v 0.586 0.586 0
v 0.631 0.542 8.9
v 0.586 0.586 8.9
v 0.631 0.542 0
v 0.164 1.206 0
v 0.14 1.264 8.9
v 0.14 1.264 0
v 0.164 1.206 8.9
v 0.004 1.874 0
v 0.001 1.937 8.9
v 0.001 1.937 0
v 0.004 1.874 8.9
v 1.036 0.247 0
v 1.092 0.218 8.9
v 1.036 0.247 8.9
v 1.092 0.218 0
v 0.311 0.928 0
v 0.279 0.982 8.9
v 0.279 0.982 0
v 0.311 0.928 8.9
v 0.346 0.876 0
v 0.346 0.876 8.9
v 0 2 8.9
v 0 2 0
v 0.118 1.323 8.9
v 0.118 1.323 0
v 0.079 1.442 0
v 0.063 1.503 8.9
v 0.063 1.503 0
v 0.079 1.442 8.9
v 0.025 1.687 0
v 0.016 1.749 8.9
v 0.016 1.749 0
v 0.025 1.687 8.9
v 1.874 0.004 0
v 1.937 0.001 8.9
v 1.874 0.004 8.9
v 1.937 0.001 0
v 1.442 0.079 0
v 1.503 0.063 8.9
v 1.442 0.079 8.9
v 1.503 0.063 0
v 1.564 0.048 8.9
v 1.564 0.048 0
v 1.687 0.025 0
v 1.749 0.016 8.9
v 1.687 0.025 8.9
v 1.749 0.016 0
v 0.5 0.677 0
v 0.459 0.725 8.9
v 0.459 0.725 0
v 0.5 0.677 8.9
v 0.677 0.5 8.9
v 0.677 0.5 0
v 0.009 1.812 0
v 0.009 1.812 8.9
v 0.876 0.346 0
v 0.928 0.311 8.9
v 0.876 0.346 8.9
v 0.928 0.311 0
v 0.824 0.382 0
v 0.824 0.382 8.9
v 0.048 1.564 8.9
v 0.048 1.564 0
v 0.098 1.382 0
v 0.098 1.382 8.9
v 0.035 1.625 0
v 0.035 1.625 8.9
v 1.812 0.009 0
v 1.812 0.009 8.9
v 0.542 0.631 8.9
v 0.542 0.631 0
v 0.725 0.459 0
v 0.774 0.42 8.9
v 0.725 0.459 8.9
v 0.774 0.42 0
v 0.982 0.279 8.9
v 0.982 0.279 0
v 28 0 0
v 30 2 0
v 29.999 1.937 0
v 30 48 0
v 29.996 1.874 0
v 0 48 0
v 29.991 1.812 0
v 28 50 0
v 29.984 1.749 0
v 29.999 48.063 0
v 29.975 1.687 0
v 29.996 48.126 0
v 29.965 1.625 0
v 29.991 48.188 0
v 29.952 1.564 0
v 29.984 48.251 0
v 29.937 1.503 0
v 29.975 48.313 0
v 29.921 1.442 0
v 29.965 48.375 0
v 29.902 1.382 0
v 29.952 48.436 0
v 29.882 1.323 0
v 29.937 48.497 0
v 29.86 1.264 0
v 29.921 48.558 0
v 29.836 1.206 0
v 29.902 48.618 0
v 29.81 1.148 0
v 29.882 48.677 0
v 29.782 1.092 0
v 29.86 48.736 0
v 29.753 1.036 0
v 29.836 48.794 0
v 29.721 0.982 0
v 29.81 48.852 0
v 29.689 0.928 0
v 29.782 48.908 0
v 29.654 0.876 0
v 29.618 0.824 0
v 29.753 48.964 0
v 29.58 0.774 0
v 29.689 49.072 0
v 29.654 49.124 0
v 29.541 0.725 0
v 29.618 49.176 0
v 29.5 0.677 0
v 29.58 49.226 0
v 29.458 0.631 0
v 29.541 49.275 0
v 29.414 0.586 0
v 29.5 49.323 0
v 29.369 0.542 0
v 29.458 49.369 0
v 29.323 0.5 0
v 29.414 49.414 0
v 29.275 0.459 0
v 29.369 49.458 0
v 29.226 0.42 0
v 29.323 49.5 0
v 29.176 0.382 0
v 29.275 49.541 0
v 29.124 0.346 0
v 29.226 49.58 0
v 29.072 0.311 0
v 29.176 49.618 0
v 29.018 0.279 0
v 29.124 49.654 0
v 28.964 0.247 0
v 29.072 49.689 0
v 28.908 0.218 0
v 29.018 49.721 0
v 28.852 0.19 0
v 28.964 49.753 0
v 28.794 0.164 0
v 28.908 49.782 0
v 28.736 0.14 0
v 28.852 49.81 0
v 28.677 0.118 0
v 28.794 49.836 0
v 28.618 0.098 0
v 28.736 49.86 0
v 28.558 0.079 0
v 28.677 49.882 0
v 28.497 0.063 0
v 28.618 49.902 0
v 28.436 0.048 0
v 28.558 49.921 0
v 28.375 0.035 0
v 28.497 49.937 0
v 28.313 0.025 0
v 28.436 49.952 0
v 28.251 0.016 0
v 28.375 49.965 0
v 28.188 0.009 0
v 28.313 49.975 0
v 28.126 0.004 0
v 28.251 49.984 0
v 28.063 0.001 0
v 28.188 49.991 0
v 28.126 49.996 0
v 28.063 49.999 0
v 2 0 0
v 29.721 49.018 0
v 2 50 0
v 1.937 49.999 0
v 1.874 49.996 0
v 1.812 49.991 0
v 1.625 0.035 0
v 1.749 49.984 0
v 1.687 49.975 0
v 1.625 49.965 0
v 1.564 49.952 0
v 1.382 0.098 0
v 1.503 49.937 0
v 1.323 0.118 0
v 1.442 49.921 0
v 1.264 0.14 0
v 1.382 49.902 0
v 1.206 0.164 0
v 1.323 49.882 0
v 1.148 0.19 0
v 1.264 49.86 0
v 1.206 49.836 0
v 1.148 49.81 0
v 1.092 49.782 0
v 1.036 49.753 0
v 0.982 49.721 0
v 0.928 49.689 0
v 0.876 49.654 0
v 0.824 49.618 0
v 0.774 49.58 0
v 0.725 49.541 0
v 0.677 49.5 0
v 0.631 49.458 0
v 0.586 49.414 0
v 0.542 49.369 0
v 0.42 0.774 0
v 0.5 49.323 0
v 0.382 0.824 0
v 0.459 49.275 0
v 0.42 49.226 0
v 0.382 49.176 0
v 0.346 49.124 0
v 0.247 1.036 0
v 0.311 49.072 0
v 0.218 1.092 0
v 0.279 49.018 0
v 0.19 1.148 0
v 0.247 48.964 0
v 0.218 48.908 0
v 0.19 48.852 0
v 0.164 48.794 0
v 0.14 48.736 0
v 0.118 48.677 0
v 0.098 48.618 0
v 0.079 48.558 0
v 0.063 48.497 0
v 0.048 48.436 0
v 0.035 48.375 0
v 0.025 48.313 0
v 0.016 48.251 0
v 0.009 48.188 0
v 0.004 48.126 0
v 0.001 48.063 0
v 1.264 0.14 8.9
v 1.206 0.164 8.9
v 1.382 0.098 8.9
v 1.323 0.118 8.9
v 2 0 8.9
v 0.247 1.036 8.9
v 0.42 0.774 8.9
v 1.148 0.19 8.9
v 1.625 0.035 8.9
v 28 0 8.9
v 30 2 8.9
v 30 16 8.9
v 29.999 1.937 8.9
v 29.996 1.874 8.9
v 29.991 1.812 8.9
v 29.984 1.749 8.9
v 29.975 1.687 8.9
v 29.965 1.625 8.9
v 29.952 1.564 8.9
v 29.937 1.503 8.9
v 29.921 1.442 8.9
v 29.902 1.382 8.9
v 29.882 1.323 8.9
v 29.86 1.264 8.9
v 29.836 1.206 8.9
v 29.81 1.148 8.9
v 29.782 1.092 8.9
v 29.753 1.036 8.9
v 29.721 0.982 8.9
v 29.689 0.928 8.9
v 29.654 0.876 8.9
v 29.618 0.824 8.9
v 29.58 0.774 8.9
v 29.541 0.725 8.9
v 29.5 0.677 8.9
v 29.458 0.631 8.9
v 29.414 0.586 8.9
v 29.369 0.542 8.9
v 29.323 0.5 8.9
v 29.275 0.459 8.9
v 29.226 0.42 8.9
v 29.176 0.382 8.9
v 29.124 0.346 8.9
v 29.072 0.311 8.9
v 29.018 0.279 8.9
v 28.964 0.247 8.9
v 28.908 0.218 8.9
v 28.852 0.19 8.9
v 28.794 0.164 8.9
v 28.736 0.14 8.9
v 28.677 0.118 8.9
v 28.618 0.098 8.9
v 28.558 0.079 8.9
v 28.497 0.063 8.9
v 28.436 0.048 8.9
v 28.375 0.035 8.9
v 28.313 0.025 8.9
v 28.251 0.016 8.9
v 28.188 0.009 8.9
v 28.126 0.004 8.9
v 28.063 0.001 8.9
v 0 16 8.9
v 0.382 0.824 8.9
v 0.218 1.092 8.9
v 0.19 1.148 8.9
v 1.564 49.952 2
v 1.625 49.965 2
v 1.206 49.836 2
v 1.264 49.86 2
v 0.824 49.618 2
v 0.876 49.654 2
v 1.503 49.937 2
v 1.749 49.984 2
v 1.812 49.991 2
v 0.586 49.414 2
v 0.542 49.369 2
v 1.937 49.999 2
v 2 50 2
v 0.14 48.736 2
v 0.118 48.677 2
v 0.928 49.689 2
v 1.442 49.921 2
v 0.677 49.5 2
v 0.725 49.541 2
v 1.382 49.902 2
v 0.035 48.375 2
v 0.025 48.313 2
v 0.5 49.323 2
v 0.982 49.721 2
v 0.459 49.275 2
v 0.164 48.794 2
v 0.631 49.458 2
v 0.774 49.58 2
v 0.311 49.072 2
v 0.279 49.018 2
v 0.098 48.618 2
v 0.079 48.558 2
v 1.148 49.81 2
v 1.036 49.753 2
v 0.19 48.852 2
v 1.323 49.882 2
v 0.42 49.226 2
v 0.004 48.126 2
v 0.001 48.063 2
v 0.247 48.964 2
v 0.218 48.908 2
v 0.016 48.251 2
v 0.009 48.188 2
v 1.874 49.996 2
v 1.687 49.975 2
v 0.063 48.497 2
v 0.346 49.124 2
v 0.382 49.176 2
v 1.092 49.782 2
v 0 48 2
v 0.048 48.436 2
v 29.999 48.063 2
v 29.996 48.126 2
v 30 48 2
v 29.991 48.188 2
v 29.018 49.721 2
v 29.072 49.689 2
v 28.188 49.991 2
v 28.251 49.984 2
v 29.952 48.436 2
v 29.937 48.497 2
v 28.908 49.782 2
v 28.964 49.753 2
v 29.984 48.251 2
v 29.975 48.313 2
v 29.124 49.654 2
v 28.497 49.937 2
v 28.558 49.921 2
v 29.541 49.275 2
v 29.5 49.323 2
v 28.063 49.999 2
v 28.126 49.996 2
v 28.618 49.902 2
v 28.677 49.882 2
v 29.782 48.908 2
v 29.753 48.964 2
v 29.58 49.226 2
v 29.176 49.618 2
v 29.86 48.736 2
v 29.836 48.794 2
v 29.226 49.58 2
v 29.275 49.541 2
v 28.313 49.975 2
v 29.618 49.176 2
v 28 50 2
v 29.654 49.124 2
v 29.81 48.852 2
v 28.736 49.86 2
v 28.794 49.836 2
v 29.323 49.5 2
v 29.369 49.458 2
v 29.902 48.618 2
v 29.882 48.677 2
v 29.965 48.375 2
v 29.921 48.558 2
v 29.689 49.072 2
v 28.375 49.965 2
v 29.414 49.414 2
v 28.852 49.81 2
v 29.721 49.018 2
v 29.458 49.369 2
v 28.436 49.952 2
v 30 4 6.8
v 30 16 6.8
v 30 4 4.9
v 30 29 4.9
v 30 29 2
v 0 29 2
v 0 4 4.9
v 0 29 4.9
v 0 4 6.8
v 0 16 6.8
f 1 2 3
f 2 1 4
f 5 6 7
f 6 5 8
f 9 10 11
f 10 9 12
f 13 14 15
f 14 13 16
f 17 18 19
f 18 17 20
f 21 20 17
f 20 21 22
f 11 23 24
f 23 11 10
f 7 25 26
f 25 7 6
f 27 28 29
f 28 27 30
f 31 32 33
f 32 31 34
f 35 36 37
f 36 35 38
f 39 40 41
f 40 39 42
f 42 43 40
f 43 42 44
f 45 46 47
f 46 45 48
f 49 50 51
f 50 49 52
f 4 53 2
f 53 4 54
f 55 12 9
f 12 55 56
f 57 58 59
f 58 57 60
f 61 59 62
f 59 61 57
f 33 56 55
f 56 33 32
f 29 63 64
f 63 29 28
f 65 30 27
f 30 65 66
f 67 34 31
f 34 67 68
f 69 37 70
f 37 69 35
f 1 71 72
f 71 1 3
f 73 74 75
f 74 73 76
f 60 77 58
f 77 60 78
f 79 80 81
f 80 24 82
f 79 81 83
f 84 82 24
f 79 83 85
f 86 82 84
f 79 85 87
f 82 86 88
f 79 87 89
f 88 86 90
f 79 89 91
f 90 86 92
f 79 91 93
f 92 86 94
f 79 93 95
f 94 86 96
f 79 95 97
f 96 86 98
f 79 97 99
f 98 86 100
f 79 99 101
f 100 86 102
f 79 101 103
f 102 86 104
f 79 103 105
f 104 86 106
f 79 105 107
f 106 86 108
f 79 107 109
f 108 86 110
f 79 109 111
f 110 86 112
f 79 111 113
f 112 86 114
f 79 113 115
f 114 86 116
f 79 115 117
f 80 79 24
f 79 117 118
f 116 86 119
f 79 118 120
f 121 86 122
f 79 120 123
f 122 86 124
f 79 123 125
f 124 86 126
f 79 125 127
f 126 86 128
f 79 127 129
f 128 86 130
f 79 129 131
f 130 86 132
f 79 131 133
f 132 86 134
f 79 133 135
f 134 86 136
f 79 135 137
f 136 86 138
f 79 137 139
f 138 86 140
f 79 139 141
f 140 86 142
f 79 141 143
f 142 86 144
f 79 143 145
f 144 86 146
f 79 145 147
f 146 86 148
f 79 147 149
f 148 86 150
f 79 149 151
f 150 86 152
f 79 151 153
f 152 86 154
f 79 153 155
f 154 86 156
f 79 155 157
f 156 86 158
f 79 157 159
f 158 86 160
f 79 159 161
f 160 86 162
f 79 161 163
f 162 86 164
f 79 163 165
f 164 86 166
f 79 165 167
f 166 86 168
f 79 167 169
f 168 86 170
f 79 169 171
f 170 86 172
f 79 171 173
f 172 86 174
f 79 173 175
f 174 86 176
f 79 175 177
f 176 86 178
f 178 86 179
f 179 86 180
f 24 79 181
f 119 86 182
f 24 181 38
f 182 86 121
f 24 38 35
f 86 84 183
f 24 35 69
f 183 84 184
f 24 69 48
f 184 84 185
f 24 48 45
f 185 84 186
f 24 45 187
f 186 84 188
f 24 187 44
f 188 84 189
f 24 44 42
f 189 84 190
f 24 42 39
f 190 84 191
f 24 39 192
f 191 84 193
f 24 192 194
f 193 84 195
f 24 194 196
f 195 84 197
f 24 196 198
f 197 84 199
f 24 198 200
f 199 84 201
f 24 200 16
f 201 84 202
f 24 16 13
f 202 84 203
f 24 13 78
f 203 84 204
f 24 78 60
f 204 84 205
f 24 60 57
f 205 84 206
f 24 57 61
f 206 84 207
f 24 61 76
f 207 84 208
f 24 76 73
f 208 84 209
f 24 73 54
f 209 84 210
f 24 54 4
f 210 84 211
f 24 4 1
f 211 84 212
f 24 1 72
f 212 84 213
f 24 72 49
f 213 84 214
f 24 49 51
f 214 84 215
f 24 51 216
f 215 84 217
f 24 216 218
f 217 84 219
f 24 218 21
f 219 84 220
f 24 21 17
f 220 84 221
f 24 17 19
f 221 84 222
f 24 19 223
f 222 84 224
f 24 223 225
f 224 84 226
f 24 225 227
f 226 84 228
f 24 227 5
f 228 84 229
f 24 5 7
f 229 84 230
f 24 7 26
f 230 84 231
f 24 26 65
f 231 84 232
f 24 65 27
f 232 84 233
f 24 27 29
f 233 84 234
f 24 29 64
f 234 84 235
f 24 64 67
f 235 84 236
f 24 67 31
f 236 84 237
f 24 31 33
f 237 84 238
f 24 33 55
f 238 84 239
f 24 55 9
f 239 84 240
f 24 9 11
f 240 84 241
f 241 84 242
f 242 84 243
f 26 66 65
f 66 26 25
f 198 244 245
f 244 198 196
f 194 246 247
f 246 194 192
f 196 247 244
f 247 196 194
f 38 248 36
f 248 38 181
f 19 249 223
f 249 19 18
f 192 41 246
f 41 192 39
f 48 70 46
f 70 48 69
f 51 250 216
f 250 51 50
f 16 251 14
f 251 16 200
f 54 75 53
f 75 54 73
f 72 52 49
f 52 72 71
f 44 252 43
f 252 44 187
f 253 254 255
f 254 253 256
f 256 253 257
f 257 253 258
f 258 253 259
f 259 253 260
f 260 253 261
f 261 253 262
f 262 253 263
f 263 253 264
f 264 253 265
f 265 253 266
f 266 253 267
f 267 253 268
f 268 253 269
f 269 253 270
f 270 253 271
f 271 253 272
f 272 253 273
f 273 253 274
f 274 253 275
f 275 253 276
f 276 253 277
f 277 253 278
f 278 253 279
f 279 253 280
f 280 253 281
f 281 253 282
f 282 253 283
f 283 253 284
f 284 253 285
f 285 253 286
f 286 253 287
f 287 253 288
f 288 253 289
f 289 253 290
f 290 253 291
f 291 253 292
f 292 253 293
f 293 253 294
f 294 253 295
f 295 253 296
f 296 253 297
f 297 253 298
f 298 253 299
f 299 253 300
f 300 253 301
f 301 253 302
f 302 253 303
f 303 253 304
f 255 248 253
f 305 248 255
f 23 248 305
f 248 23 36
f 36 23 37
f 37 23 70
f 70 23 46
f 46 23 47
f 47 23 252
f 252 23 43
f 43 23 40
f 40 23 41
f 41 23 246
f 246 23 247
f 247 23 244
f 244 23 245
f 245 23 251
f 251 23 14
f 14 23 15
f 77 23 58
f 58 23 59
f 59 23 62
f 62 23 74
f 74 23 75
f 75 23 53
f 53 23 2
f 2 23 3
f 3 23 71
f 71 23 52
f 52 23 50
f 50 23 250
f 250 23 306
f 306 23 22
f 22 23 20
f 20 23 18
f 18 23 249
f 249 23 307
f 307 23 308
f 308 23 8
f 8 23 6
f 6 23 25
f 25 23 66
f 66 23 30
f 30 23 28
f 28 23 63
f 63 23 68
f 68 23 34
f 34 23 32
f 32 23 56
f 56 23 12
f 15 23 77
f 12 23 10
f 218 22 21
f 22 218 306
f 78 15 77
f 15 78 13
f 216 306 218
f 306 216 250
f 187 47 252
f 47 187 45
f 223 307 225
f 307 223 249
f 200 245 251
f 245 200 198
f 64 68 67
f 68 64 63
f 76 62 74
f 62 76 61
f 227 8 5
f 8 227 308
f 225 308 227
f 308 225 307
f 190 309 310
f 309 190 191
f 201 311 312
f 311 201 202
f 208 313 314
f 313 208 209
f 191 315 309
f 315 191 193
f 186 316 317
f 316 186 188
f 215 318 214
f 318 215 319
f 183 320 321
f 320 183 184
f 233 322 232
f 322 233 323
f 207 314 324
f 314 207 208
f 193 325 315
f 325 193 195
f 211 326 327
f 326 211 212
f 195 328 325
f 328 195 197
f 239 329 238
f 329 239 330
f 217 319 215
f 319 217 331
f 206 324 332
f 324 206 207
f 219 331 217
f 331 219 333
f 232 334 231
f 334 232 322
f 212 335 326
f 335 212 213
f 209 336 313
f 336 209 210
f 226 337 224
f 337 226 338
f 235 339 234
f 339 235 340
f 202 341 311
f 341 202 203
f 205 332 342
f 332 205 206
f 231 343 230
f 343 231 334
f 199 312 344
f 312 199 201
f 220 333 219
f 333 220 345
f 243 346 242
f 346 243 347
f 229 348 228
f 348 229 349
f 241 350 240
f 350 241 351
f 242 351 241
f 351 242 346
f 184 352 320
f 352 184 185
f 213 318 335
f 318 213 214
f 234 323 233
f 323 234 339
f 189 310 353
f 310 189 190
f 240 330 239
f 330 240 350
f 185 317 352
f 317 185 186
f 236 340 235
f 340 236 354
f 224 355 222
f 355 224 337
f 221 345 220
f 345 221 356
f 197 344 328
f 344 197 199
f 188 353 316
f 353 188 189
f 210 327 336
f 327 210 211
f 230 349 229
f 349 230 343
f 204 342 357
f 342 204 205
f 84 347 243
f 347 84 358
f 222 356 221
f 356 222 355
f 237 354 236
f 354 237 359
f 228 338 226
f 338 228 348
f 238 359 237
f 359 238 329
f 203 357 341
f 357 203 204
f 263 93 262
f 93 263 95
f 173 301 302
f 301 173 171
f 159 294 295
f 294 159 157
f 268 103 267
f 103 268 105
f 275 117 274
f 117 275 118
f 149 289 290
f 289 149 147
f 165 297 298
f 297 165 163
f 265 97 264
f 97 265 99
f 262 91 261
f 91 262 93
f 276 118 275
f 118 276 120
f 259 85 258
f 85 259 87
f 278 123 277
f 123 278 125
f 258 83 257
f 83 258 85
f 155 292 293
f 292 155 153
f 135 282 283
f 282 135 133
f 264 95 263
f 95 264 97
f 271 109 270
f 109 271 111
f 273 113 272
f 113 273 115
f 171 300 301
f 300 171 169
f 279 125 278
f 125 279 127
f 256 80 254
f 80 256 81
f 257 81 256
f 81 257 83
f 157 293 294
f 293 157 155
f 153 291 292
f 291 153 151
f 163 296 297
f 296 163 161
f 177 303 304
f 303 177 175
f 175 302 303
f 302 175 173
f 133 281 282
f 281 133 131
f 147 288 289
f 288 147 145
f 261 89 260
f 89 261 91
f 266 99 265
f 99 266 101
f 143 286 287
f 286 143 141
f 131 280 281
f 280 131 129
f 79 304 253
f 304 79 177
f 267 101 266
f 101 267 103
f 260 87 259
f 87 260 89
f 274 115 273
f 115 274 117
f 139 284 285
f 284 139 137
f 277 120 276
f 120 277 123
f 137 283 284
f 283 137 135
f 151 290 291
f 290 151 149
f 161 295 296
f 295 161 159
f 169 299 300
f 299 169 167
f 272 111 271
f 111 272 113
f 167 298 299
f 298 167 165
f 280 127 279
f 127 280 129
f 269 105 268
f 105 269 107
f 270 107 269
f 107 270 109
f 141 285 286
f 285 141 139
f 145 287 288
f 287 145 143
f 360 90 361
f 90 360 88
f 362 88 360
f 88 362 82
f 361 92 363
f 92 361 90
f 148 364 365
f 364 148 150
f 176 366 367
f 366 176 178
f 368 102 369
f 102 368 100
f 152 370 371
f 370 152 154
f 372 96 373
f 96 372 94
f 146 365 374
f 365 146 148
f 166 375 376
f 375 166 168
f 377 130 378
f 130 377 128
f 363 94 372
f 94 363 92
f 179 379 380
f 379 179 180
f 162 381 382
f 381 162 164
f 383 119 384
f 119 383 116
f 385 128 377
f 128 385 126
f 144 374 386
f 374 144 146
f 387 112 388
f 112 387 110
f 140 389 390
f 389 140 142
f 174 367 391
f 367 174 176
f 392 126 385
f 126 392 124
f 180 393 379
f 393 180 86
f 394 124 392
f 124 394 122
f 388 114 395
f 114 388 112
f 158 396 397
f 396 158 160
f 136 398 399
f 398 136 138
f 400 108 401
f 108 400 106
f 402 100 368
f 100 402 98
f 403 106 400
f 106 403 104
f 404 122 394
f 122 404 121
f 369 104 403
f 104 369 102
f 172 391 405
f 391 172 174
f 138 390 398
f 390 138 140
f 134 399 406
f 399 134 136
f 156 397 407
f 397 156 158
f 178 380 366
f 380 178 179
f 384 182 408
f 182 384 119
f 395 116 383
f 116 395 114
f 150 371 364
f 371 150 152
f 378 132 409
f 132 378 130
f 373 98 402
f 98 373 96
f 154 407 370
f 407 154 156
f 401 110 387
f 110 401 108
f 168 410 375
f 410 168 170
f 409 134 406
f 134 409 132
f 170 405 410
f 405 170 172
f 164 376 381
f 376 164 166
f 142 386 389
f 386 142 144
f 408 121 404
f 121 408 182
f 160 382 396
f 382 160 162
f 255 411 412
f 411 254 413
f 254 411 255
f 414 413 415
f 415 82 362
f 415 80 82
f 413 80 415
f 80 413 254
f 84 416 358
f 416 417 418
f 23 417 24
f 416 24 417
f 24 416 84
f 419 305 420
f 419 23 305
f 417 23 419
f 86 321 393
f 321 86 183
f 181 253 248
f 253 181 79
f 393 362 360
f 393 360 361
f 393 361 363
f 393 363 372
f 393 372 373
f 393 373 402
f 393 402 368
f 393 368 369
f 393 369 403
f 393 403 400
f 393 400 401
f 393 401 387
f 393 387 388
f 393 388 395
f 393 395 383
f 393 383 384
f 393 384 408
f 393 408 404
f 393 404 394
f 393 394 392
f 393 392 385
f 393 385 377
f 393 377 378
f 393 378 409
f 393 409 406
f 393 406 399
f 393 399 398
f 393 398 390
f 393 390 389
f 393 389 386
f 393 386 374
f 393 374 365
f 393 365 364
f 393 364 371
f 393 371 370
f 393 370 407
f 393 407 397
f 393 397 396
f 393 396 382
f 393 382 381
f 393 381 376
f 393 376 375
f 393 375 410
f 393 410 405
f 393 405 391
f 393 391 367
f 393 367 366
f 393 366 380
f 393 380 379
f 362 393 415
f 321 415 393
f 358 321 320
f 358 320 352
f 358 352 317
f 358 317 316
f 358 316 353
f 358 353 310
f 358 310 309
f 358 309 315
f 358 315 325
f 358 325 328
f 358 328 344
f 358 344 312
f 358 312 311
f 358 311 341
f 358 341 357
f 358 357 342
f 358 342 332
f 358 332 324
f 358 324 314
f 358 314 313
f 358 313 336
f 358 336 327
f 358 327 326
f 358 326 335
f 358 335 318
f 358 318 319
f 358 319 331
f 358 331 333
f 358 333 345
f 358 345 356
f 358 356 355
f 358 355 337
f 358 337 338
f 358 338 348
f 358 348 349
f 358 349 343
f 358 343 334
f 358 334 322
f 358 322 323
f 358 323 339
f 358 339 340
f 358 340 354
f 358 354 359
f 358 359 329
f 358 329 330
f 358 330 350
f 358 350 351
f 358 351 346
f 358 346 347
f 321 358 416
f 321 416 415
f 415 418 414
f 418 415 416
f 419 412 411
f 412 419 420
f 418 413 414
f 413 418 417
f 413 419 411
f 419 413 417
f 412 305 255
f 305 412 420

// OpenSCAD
// file: ../sc.scad
// ShortCuts.scad 
// Autor: Rudolf Huttary, Berlin 2015
//
$fn = 100; 

//show_examples(); 

module show_examples()
	place_in_rect(30, 30)
	{
		Cy(h = 10); 
		CyH(h = 10); 
		CyH(h = 10, w = 30); 
		CyS(h = 10); 
		CyS(h = 10, w1 = 25, w2 = 75); 
		Cu(10); 
		Ri(h = 10); 
		RiH(h = 10); 
		RiS(h = 10, w1 = 10); 
		RiS(h = 10, w1 = 30, w2 = 300); 
		Sp(); 
		SpH(10, 30, 30); 
	}


module help()
{
echo("==============="); 
echo("help(): shows this help"); 
echo("show_examples(): shows some examples"); 
echo("place_in_rect(): places children objects in grid"); 
echo("Transformations:"); 
echo(" transform :  T(x=0, y=0, z=0), Tx(x=0) , Ty(y=0), Tz(z=0)"); 
echo(" rotate :  R(x=0, y=0, z=0), Rx(x=0) , Ry(y=0), Rz(z=0)"); 
echo(" scale :  S(x=1, y=1, z=1), Sx(x=1) , Sy(y=1), Sz(z=1)"); 
echo("Logical"); 
echo(" difference :  D()"); 
echo(" union :  U()"); 
echo(" intersection : *missing*"); 
echo("Primitives"); 
echo(" circle :  Ci(r=10)"); 
echo(" circle_half :  CiH(r=10, w=0)")
echo(" circle_segment :  CiS(r=10, w1=0, w2=90)")
echo(" square :  Sq(x=10, y=0, center=true))"); 
echo(" cylinder :  Cy(r=10, h=1, center=true)"); 
echo(" cylinder_half :  CyH(r=10, w=0)")
echo(" cylinder_segment: CyS(r=10, h=1, w1=0, w2=90,center=true)"); 
echo(" cylinder_segment: Pie(r=10, h=1, w1=0, w2=90,center=true)"); 
echo(" cube :  Cu(x=10, y=0, z=10, center=true)"); 
echo(" ring :  Ri(R=10, r=5, h=1, center=true)"); 
echo(" ring_half :  RiH(R=10, r=5, h=1, w=0 center=true)"); 
echo(" ring_segment :  RiS(R=10, r=5, h=1, w1=0, w2=90, center=true)"); 
echo(" sphere:  Sp(r=10))"); 
echo(" sphere_half:  SpH(r=10, w1 = 0, w2 = 0))"); 
echo("==============="); 
}

// Euclidean Transformations
module T(x=0, y=0, z=0){translate([x, y, z])children(); }
module Tx(x) { translate([x, 0, 0])children(); }
module Ty(y) { translate([0, y, 0])children(); }
module Tz(z) { translate([0, 0, z])children(); }

module R(x=0, y=0, z=0){rotate([x, y, z]) children();}
module Rx(x=90){rotate([x, 0, 0]) children();}
module Ry(y=90){rotate([0, y, 0]) children();}
module Rz(z=90){rotate([0, 0, z]) children();}

module M(x=0, y=0, z=0){mirror([x, y, z]) children();}
module Mx(x=1){mirror([x, 0, 0]) children();}
module My(y=1){mirror([0, y, 0]) children();}
module Mz(z=1){mirror([0, 0, z]) children();}

module S(x=1, y=1, z=1){scale([x, y, z]) children();}
module Sx(x=1){scale([x, 1, 1]) children();}
module Sy(y=1){scale([1, y, 1]) children();}
module Sz(z=1){scale([1, 1, z]) children();}

module D() difference(){children(0); children([1:$children-1]);}
module U() children([0:$children-1]);
// module I() intersection()children([0:$children-1]); // does not work for some reason


// primitives - 2D

module Sq(x =10, y = 0, center = false)
{
   if(y==0)
		square([x, x], center = center); 
	else
		square([x, y], center = center); 
}
module Ci(r = 10)
{
	circle(r = r); 
}

// derived primitives - 2d
module CiH(r = 10, w = 0)
  circle_half(r, w); 

module CiS(r = 10, w1 = 0, w2 = 90)
  circle_segment(r, w1, w2); 


// primitives - 3d
module Cy(r = 10, h = 1, center = false)
{
	cylinder(r = r, h = h, center = center); 
}
module Cu(x = 10, y = 0, z = 10, center = false)
{
  if (y==0)
	cube([x, x, x], center = center); 
  else
	cube([x, y, z], center = center); 
}

// derived primitives - 3d
module CyH(r = 10, h = 1, w = 0, center = false)
  cylinder_half(r, h, w, center); 

module CyS(r = 10, h = 1, w1 = 0, w2 = 90, center = false)
  cylinder_segment(r, h, w1, w2, center); 

module Ri(R = 10, r = 5, h = 1, center = false)
  ring(R, r, h, center); 

module RiS(R = 10, r = 5, h = 1, w1 = 0, w2 = 90, center = false)
   ring_segment(R, r, h, w1, w2, center); 

module RiH(r1 = 10, r2, h = 1, w = 0, center = false)
   ring_half(r1, r2, h, w, center); 
module Pie(r = 10, h = 1, w1 = 0, w2 = 90, center = false)
  cylinder_segment(r, h, w1, w2, center);  
module Sp(r = 10)
  sphere(r); 
module SpH(r = 10, w1 = 0, w2 = 0)
  sphere_half(r, w1, w2); 
module SpS(r = 10, w1 = 0, w2 = 90, w3 = 90)
  sphere_segment(r, w1, w2); 




// clear text definitions
module circle_half(r = 10, w = 0)
{
	difference()
	{
		circle(r); 
     rotate([0, 0, w-90])
     translate([0, -r])
		square([r, 2*r], center = false); 
	}
}

module circle_segment(r = 10, w1 = 0, w2 = 90)
{
  W2 = (w1>w2)?w2+360:w2; 
  if (W2-w1 < 180)
    intersection()
		{
       circle_half(r, w1); 
       circle_half(r, W2-180); 
 		}
	else
    union()
		{
       circle_half(r, w1); 
       circle_half(r, W2-180); 
 		}
}

module cylinder_half(r = 10, h = 1, w = 0, center = true)
{
  linear_extrude(height = h, center = center)
  circle_half(r, w); 
} 

module cylinder_segment(r = 10, h = 1, w1 = 0, w2 = 90, center = true)
{
  linear_extrude(height = h, center = center)
  circle_segment(r, w1, w2); 
} 

module ring(R = 10, r = 5, h = 1, center = true)
{
	difference()
	{
	cylinder(r = R, h = h, center = center); 
   translate([0, 0, -2*h])
	cylinder(r = r, h = 4*h, center = false); 
	}
}

module ring_half(R = 10, r = 5, h = 1, w = 0, center = true)
{
	difference()
	{
		ring(R, r, h, center); 
     rotate([0, 0, w])
     translate([0, -R/2, 0])
		cube([2*R, R, 3*h], center = true); 
	}
}

module ring_segment(R = 10, r = 5, h = 1, w1 = 0, w2 = 90, center = true)
{
  W2 = (w1>w2)?w2+360:w2; 
  if (W2-w1 < 180)
    intersection()
		{
       ring_half(R, r, h, w1, center); 
       ring_half(R, r, h, W2-180, center); 
 		}
	else
    union()
		{
       ring_half(R, r, h, w1, center); 
       ring_half(R, r, h, W2-180, center); 
 		}
}


module sphere_half(r = 10, w1 = 0, w2 = 0)
{  
	difference()
	{
   	sphere(r); 
      rotate([-w1, -w2, 0])
     	translate([0, 0, r])
		cube([2*r, 2*r, r], center = true); 
	}

}


// additional code
module place_in_rect(dx =20, dy=20)
{
  cols = ceil(sqrt($children)); 
  rows = floor(sqrt($children)); 
  for(i = [0:$children-1])
	{ 
	  T(dx*(-cols/2+(i%cols)+.5), dy*(rows/2-floor(i/cols)-.5))
		 children(i); 
	}
}
// file: config.scad
/* SuperSlicer */
fit=0.3;
pressfit=0.2;
tol=0.2;
/* PrusaSlicer *
fit=0.5;
pressfit=0.4;
tol=0.3;
/**/
m3=3.2+tol;
m3_nut=5.5+tol;

m5=5.25;
fc=5.25;   // frame chanel

layer_height=0.28;

/* Carriage Dimensions */
tbd=27; //top bottom depth
tbw=44;

car_thick=8;
car_width=44;   // Min. 42mm

axis_diam=8;
bush_width=15;
ybush_len=45;   //LM8LUU
xbush_len= car_width-4;
axis_distance=55;
thick_min=2;
r=(bush_width/2)+thick_min;
d=r*2;
dax=24; //15 center to axis

// distance from belts center to frame
upper_distance = dax + 13/2 + 3;   

center_h=axis_distance-d;
thick= 6;

belt_size=6;
belt_distance=3; // internal space between belts
belt_thick=1.4;

center=axis_distance/2+r;
center_from_top= center;
center_screw_z=center_h/2-.5;

// Total height of hotend (top to nozzle tip) in mm (E3Dv6: ~63mm, Volcano: ~72mm)
hotend_height = 72.6;

Mountingpoint_width = 30;
// main file
include <config.scad>
use <parts.scad>
use <../lib.scad>
$fn=200;

line_width=0.44;
line_height=0.20;

w=30;
l=50;
bh=3;
gh=1.9;
t=2;
gcut=25;
gsup=12;

h=bh+gh+2*t;

//rotate([0,0,90])
{
    difference(){
        union(){
            rcube(w,l,h,2);
        }
        
        // bed cut
        translate([-.1, gcut+t*2, t])
        cube([w+1, l,bh]);

        // glass cut
        translate([-.1, t*2, bh+t-.1])
        cube([w+1, l,gh]);
        
        translate([-.1, gsup+t*2, t+bh])
        cube([w+1, l,h]);
    }
}
